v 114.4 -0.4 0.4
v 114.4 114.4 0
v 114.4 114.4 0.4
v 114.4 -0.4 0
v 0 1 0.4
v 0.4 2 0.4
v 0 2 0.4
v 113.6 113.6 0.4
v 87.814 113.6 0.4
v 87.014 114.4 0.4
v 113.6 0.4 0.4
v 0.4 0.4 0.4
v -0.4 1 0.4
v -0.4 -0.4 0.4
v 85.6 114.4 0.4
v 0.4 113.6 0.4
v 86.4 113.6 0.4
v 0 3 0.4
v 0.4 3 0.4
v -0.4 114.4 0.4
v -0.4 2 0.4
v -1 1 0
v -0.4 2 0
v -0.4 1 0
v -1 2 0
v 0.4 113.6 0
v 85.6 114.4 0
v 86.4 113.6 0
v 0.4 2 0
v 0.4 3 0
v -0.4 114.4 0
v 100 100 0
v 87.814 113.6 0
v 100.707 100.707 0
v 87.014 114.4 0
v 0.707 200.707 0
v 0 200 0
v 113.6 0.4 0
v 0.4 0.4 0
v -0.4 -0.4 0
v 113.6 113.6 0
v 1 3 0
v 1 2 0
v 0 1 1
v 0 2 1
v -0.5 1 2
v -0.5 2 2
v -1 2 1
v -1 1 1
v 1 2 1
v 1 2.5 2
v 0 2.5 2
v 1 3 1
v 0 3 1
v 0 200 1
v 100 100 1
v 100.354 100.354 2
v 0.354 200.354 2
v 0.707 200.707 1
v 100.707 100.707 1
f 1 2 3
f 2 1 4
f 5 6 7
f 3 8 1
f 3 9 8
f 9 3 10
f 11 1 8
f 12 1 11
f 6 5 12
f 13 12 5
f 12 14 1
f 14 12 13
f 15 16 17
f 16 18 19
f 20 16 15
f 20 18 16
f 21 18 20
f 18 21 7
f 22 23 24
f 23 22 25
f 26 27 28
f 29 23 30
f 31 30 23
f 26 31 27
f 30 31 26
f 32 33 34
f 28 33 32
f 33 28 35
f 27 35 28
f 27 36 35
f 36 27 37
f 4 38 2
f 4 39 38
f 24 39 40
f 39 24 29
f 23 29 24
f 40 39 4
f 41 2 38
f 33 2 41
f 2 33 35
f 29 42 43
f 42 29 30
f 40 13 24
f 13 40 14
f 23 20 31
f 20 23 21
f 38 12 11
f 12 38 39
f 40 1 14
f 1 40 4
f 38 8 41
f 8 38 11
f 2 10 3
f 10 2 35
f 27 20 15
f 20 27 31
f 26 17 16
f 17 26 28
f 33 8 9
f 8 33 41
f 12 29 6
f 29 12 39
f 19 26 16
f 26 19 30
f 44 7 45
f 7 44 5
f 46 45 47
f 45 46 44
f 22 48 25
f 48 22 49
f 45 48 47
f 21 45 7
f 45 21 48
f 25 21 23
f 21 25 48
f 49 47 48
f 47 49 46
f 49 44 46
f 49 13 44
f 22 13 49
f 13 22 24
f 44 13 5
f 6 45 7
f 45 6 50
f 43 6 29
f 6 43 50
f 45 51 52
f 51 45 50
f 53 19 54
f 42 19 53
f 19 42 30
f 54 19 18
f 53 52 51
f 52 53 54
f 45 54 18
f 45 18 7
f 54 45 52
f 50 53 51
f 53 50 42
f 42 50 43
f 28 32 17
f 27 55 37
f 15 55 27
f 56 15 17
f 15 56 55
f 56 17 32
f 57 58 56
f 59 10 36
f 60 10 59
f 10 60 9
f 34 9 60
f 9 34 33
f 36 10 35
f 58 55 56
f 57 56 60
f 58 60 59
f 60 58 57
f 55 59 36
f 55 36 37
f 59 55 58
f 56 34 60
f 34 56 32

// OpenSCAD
zheight=0.4;
width=0.8;

module line(a=[0,0],b=[0,0]){
    dist=sqrt(pow(b[1]-a[1],2)+pow(b[0]-a[0],2));
    ang=atan((b[1]-a[1])/(b[0]-a[0]));
    angmod=
    ((b[0]<a[0])&&(b[1]>=a[1]))?-180:
    ((b[0]>=a[0])&&(b[1]<=a[1]))?0:
    ((b[0]<=a[0])&&(b[1]<=a[1]))?-180:0;
    
    translate([a[0],a[1],0])
    rotate([0,0,ang+angmod])
    translate([-width/2,-width/2,0])
    cube([dist+width,width,zheight]);
}

module extrusion(p,n,a=[0,0],b=[0,0]){
    dist=sqrt(pow(b[1]-a[1],2)+pow(b[0]-a[0],2));
    ang=atan((b[1]-a[1])/(b[0]-a[0]));
    angmod=
    ((b[0]<a[0])&&(b[1]>=a[1]))?-180:
    ((b[0]>=a[0])&&(b[1]<=a[1]))?0:
    ((b[0]<=a[0])&&(b[1]<=a[1]))?-180:0;
    
    translate([a[0],a[1],0])
    rotate([0,0,ang+angmod])
rotate([0,90,0])
rotate([0,0,90])
    linear_extrude(dist,convexity=10)
    polygon(p);
}

module drawlines(args){
    for (i=[0:len(args)-2]){
        line([args[i][0],args[i][1]],[args[i+1][0],args[i+1][1]]);
    }
}


module drawextrusions(p,n,l){
    for (i=[0:len(l)-2]){
        extrusion(p,n,[l[i][0],l[i][1]],[l[i+1][0],l[i+1][1]]);
    }
}

module linesquare(size){
    union(){
        drawlines([[0,0],[size,0],[size,size],[0,size],[0,0]]);
    }
}
//linear_extrude(10,convexity=10)
//polygon(points=[[0,0],[1,0],[1,1],[0,1]]);

linesquare(114);
extrusion([[0,0],[1,0],[1,1],[0.5,2],[0,1]],[0,0,1],[0,200],[100,100]);

drawextrusions([[0,0],[1,0],[1,1],[0.5,2],[0,1]],[0,0,1],[[0,1],[0,2],[1,2]]);
